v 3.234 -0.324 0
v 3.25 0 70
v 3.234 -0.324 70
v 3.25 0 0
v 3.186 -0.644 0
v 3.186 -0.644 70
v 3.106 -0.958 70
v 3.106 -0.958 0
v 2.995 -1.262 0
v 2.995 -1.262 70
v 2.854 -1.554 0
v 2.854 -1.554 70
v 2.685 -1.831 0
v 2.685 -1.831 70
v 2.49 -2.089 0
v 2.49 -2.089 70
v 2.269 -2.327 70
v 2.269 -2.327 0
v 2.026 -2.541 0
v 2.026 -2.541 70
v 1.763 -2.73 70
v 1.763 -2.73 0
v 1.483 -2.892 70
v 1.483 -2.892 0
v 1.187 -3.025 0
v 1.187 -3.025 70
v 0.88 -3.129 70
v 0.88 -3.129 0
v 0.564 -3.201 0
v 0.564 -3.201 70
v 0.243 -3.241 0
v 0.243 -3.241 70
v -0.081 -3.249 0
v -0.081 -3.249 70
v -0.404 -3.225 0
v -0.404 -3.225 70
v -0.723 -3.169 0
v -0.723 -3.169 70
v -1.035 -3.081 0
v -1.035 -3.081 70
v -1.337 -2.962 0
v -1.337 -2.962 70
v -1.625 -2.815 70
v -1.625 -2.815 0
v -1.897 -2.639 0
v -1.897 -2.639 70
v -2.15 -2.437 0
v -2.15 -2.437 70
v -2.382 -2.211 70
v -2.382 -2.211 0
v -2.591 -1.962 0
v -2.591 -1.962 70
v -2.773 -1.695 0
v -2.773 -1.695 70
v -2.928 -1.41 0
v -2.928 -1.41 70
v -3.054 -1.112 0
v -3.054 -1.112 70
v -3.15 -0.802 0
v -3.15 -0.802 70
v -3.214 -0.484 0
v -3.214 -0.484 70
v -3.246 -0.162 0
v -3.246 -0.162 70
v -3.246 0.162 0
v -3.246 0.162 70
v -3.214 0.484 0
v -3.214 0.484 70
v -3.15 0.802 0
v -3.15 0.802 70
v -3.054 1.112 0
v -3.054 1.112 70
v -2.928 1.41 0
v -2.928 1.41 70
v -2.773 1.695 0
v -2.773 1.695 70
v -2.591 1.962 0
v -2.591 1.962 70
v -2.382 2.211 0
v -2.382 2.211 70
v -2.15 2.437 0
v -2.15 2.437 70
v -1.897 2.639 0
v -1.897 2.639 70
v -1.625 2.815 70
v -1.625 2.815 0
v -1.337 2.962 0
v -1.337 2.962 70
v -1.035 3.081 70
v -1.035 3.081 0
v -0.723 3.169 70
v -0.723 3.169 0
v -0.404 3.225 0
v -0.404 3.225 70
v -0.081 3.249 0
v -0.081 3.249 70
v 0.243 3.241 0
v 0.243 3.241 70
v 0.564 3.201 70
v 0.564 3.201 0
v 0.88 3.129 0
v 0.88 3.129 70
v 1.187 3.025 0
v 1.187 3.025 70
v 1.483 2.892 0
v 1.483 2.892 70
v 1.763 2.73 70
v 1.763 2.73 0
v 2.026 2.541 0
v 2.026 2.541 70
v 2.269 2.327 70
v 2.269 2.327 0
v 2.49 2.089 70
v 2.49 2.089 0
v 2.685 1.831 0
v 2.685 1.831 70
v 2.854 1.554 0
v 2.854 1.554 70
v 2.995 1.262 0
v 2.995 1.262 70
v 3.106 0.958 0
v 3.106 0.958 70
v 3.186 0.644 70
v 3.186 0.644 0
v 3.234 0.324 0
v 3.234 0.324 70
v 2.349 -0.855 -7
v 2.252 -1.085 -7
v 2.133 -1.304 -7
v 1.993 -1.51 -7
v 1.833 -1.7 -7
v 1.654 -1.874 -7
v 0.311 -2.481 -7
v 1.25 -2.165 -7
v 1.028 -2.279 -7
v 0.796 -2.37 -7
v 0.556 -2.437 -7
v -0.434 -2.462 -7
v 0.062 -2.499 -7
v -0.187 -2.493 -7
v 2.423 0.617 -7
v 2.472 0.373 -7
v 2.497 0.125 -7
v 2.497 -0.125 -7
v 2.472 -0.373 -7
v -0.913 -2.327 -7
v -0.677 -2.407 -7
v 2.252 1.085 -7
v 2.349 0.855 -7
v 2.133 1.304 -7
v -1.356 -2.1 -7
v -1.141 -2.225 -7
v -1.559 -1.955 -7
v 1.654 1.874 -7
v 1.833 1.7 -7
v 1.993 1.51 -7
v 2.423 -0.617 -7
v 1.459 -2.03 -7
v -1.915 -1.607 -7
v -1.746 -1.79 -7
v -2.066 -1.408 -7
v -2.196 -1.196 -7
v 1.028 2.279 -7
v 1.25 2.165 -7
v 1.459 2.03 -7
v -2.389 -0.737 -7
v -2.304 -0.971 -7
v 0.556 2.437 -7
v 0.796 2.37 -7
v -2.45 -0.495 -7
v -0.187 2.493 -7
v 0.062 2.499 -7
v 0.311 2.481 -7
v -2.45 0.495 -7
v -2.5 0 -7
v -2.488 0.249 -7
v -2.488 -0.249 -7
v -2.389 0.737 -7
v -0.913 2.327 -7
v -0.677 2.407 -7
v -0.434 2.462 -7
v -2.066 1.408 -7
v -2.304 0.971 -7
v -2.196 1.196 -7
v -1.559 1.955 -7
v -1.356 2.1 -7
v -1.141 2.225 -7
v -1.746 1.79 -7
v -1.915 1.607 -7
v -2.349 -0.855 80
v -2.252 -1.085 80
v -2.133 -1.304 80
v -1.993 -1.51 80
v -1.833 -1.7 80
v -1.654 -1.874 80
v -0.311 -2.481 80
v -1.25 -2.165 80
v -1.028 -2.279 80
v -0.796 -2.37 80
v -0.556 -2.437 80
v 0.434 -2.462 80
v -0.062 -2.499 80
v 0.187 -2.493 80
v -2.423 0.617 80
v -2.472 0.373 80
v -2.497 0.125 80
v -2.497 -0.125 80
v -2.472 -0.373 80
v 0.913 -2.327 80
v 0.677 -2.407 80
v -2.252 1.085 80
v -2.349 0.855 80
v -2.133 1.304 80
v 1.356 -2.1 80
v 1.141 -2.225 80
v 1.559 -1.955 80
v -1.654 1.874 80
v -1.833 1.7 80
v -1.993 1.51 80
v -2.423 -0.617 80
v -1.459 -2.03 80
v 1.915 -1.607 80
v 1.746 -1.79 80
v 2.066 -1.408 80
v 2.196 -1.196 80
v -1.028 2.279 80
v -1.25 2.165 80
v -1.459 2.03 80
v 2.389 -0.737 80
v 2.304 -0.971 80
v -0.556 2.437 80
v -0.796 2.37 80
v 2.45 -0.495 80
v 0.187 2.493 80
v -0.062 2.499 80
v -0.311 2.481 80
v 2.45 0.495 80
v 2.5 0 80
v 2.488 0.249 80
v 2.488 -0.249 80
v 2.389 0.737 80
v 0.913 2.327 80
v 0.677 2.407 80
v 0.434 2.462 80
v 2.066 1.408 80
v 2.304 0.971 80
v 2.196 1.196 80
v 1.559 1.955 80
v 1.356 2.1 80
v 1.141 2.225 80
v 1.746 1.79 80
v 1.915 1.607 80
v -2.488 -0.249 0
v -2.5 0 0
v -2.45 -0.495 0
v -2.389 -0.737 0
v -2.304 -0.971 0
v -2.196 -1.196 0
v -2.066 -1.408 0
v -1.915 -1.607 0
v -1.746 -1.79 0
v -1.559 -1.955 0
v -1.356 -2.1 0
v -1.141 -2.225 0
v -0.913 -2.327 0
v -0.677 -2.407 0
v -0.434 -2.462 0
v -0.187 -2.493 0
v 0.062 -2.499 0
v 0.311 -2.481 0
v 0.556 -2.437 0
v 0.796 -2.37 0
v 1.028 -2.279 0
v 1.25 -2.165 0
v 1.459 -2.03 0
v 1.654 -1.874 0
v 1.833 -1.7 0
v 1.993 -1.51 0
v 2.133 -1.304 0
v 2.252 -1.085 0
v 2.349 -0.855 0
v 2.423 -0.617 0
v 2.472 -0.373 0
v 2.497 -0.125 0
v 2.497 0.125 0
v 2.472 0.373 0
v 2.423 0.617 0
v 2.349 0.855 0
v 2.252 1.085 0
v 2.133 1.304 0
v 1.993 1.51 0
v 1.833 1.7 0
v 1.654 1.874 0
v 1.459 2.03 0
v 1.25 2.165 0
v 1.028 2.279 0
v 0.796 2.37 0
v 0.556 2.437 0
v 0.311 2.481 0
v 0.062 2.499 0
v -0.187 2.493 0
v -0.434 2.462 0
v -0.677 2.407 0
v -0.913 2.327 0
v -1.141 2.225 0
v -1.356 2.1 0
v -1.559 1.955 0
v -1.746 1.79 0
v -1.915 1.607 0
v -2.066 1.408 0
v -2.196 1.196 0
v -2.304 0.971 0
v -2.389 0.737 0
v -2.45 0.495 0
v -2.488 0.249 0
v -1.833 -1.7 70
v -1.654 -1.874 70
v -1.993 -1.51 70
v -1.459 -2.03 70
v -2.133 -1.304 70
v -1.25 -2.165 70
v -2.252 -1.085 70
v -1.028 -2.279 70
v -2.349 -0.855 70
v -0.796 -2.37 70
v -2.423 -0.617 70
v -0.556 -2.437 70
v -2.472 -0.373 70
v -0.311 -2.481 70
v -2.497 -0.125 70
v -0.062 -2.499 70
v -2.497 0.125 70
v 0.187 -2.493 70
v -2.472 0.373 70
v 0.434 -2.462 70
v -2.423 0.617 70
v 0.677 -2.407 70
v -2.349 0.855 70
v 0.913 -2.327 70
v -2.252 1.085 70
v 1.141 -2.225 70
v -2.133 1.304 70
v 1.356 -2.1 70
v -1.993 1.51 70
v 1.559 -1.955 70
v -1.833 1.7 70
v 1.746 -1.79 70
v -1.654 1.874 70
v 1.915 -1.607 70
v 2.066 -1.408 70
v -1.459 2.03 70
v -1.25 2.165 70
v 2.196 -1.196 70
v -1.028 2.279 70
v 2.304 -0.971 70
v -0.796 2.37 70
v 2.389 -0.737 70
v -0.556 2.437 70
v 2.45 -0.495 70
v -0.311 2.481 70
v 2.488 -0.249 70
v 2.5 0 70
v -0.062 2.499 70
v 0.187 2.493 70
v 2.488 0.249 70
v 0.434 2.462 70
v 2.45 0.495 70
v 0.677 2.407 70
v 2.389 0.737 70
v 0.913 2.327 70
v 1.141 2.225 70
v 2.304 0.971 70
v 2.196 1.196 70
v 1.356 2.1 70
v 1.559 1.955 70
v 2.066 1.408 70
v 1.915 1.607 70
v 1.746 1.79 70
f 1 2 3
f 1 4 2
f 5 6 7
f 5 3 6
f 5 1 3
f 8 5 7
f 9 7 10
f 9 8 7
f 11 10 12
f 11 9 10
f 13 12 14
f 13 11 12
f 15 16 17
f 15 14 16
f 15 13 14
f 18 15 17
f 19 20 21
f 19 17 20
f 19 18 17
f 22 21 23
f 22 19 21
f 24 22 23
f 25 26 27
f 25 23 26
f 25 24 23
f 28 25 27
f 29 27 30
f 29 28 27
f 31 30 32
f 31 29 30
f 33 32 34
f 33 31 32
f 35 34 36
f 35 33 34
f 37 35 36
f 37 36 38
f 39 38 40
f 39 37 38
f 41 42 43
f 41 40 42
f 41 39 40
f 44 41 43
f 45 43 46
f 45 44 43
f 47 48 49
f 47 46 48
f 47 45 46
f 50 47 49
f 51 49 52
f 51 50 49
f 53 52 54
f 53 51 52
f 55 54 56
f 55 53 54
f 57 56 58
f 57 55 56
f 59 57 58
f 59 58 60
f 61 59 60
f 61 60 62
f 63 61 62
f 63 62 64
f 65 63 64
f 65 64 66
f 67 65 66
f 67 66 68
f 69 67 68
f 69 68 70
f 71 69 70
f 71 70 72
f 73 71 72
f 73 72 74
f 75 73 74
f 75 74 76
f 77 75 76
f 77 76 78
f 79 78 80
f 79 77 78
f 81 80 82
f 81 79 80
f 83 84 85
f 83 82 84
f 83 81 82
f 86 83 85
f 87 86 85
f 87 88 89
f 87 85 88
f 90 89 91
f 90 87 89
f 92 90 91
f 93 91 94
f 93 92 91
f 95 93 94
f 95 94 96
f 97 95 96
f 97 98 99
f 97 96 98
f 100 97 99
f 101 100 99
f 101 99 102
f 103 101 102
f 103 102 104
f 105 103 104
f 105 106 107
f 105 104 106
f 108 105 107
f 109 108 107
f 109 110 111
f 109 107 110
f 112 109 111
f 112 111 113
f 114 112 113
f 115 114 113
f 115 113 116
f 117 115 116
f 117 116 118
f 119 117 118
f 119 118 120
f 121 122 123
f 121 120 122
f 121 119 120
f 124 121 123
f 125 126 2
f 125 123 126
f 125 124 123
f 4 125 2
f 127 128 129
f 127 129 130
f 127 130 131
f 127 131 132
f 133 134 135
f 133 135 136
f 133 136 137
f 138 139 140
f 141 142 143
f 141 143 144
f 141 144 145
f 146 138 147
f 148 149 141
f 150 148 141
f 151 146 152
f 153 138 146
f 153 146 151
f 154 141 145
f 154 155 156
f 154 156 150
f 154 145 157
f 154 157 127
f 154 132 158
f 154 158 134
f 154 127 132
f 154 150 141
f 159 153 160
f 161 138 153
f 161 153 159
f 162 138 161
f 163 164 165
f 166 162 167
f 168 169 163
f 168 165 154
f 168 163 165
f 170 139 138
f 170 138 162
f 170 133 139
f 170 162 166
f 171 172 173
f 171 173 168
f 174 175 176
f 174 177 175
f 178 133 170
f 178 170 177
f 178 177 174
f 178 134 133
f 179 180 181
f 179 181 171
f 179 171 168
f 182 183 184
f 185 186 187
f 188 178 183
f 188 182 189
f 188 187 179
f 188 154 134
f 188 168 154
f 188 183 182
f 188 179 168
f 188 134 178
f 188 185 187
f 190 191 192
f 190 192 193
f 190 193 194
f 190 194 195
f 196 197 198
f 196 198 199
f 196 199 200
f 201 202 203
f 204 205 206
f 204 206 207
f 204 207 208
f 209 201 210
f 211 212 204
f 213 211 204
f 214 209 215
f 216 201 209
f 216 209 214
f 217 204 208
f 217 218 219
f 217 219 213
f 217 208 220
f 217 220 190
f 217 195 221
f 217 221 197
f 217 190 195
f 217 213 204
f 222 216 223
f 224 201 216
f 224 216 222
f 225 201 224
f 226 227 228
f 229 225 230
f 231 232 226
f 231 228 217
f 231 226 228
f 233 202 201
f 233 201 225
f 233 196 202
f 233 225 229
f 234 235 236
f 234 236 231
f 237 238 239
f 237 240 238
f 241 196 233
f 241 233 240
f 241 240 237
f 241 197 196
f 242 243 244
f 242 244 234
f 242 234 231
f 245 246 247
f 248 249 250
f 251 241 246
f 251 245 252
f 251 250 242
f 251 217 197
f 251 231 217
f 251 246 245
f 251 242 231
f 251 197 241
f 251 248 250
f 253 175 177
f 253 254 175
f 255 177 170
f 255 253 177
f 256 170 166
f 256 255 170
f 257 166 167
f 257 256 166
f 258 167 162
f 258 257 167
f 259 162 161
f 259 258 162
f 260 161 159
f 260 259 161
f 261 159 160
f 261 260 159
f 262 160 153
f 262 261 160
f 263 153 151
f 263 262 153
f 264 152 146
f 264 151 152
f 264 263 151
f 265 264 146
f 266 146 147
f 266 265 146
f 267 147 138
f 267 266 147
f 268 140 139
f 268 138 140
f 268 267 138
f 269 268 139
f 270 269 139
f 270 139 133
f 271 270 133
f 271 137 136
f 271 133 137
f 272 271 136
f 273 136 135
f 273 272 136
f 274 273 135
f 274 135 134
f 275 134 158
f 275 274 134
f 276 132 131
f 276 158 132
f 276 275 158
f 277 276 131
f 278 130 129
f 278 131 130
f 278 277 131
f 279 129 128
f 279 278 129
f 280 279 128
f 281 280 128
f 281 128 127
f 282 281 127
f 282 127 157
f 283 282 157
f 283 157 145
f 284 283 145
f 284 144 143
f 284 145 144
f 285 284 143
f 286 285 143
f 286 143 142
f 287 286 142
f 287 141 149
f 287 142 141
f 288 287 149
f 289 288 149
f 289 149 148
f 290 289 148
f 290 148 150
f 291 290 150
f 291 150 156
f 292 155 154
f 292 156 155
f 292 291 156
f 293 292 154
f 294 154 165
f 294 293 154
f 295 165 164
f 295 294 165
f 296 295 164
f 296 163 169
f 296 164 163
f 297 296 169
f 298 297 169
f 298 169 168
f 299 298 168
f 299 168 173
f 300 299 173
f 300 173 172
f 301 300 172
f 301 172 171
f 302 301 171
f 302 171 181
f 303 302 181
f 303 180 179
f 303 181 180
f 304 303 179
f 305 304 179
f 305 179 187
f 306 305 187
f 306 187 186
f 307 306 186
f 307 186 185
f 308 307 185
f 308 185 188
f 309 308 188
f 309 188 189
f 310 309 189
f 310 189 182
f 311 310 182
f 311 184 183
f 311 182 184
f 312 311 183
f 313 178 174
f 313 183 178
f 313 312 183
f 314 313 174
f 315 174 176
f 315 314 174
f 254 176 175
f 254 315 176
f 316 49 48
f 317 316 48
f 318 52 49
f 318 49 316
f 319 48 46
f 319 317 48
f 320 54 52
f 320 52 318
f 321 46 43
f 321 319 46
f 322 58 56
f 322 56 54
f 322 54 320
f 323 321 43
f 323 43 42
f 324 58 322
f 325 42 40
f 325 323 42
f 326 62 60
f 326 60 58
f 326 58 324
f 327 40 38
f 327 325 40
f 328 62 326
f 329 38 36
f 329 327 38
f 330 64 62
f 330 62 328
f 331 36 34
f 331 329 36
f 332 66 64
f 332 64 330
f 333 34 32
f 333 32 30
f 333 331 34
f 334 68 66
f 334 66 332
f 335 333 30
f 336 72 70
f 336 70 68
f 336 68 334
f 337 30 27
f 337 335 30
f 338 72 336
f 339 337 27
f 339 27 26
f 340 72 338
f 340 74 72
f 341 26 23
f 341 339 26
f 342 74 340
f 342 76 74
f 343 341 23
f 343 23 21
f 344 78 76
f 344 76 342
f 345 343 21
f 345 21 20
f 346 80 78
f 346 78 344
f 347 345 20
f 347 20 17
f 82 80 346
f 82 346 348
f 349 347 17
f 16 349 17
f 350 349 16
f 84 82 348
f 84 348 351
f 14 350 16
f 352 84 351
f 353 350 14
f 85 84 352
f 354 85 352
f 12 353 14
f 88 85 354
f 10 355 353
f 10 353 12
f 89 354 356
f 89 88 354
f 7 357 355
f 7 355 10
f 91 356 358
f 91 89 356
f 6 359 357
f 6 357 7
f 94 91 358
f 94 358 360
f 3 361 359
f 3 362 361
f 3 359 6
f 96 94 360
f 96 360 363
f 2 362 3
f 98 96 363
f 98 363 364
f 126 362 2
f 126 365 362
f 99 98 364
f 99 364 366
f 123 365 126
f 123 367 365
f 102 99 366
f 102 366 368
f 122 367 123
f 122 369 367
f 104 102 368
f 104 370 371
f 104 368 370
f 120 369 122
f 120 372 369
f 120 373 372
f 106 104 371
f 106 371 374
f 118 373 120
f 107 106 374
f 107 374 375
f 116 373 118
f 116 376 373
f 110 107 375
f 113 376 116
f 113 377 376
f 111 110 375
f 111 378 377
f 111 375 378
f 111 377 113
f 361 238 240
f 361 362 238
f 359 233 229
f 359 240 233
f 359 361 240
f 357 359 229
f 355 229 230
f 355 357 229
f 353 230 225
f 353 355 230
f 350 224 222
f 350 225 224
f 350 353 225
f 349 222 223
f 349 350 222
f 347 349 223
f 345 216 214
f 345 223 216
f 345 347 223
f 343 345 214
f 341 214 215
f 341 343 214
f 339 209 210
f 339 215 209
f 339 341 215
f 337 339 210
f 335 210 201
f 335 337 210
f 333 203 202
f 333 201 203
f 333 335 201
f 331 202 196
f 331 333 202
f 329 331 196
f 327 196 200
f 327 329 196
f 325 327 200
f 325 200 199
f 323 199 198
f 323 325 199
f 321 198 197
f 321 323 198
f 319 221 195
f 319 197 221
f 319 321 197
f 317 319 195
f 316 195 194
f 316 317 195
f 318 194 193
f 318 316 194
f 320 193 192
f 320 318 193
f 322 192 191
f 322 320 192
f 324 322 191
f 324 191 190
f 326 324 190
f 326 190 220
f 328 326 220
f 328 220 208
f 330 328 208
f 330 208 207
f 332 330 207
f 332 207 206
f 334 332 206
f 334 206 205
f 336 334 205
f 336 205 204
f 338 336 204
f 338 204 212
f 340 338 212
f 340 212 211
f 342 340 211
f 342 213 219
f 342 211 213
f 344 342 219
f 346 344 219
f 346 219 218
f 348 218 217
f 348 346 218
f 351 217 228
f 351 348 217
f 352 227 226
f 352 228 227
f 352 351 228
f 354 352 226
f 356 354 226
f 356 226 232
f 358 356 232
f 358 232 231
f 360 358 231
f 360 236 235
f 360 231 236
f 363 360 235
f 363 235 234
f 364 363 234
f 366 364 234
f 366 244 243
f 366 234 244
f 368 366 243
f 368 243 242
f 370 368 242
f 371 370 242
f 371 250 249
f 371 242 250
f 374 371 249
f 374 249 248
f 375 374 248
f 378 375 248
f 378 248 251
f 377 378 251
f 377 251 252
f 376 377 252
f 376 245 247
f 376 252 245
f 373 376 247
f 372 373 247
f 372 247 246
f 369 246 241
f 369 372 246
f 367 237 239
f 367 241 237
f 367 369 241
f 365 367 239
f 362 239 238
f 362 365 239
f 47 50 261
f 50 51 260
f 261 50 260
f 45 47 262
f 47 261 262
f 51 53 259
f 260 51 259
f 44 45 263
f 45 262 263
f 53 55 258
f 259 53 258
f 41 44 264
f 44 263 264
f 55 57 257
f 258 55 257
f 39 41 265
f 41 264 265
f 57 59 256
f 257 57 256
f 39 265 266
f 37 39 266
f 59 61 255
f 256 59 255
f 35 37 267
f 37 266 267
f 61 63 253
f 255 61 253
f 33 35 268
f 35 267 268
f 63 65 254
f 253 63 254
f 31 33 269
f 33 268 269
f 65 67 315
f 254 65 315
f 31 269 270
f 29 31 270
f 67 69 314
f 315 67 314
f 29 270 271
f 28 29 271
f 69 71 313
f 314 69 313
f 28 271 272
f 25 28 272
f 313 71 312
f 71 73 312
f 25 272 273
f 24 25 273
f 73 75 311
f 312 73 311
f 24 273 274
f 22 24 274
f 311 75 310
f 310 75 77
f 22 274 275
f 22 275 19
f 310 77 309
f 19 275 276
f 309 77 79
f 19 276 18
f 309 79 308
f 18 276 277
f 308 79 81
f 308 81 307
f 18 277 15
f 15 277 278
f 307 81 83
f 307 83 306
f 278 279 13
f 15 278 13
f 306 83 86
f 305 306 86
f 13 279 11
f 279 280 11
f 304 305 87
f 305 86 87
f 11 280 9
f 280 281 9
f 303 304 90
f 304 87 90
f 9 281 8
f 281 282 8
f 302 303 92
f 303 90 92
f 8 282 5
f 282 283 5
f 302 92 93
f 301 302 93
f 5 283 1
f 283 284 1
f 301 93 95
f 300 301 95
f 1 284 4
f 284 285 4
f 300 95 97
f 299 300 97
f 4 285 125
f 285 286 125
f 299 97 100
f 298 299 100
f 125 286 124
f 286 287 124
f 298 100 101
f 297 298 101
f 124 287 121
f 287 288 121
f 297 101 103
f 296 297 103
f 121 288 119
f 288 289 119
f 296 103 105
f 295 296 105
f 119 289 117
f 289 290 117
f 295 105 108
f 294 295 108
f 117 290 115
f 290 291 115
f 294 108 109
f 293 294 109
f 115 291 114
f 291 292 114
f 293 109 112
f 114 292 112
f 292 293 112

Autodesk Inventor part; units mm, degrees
ref_plane "YZ Plane" through (0, 0, 0) normal (1, 0, 0) x (0, 1, 0)
ref_plane "XZ Plane" through (0, 0, 0) normal (0, 1, 0) x (-1, 0, 0)
ref_plane "XY Plane" through (0, 0, 0) normal (0, 0, 1) x (1, 0, 0)
sketch "Sketch1" plane through (0, 0, 0) normal (0, 0, 1) x (1, 0, 0)
  circle A0 centre (0, 0) radius 3.25
  dimension "d0" = 6.5
extrude "Extrusion1" add sketch "Sketch1" along normal blind 70
sketch "Sketch2" plane through (0, 0, 70) normal (0, 0, 1) x (1, 0, 0)
  circle A0 centre (0, 0) radius 3.25 projected
  circle A1 centre (0, 0) radius 2.5
  dimension "d3" = 5
extrude "Extrusion2" add sketch "Sketch2" along normal blind 10 contours A1
sketch "Sketch3" plane through (0, 0, 0) normal (0, 0, -1) x (-1, 0, 0)
  circle A0 centre (0, 0) radius 3.25 projected
  circle A1 centre (0, 0) radius 2.5
  dimension "d6" = 5
extrude "Extrusion3" add sketch "Sketch3" along normal blind 7 contours A1
thread "Thread1" size "M5x0.8" class "6g" standard "ANSI Metric M Profile" length 10
thread "Thread2" size "M5x0.8" class "6g" standard "ANSI Metric M Profile" length 7
properties part number "18 - Piston Rod" material "Steel AISI 1020 107 HR"
